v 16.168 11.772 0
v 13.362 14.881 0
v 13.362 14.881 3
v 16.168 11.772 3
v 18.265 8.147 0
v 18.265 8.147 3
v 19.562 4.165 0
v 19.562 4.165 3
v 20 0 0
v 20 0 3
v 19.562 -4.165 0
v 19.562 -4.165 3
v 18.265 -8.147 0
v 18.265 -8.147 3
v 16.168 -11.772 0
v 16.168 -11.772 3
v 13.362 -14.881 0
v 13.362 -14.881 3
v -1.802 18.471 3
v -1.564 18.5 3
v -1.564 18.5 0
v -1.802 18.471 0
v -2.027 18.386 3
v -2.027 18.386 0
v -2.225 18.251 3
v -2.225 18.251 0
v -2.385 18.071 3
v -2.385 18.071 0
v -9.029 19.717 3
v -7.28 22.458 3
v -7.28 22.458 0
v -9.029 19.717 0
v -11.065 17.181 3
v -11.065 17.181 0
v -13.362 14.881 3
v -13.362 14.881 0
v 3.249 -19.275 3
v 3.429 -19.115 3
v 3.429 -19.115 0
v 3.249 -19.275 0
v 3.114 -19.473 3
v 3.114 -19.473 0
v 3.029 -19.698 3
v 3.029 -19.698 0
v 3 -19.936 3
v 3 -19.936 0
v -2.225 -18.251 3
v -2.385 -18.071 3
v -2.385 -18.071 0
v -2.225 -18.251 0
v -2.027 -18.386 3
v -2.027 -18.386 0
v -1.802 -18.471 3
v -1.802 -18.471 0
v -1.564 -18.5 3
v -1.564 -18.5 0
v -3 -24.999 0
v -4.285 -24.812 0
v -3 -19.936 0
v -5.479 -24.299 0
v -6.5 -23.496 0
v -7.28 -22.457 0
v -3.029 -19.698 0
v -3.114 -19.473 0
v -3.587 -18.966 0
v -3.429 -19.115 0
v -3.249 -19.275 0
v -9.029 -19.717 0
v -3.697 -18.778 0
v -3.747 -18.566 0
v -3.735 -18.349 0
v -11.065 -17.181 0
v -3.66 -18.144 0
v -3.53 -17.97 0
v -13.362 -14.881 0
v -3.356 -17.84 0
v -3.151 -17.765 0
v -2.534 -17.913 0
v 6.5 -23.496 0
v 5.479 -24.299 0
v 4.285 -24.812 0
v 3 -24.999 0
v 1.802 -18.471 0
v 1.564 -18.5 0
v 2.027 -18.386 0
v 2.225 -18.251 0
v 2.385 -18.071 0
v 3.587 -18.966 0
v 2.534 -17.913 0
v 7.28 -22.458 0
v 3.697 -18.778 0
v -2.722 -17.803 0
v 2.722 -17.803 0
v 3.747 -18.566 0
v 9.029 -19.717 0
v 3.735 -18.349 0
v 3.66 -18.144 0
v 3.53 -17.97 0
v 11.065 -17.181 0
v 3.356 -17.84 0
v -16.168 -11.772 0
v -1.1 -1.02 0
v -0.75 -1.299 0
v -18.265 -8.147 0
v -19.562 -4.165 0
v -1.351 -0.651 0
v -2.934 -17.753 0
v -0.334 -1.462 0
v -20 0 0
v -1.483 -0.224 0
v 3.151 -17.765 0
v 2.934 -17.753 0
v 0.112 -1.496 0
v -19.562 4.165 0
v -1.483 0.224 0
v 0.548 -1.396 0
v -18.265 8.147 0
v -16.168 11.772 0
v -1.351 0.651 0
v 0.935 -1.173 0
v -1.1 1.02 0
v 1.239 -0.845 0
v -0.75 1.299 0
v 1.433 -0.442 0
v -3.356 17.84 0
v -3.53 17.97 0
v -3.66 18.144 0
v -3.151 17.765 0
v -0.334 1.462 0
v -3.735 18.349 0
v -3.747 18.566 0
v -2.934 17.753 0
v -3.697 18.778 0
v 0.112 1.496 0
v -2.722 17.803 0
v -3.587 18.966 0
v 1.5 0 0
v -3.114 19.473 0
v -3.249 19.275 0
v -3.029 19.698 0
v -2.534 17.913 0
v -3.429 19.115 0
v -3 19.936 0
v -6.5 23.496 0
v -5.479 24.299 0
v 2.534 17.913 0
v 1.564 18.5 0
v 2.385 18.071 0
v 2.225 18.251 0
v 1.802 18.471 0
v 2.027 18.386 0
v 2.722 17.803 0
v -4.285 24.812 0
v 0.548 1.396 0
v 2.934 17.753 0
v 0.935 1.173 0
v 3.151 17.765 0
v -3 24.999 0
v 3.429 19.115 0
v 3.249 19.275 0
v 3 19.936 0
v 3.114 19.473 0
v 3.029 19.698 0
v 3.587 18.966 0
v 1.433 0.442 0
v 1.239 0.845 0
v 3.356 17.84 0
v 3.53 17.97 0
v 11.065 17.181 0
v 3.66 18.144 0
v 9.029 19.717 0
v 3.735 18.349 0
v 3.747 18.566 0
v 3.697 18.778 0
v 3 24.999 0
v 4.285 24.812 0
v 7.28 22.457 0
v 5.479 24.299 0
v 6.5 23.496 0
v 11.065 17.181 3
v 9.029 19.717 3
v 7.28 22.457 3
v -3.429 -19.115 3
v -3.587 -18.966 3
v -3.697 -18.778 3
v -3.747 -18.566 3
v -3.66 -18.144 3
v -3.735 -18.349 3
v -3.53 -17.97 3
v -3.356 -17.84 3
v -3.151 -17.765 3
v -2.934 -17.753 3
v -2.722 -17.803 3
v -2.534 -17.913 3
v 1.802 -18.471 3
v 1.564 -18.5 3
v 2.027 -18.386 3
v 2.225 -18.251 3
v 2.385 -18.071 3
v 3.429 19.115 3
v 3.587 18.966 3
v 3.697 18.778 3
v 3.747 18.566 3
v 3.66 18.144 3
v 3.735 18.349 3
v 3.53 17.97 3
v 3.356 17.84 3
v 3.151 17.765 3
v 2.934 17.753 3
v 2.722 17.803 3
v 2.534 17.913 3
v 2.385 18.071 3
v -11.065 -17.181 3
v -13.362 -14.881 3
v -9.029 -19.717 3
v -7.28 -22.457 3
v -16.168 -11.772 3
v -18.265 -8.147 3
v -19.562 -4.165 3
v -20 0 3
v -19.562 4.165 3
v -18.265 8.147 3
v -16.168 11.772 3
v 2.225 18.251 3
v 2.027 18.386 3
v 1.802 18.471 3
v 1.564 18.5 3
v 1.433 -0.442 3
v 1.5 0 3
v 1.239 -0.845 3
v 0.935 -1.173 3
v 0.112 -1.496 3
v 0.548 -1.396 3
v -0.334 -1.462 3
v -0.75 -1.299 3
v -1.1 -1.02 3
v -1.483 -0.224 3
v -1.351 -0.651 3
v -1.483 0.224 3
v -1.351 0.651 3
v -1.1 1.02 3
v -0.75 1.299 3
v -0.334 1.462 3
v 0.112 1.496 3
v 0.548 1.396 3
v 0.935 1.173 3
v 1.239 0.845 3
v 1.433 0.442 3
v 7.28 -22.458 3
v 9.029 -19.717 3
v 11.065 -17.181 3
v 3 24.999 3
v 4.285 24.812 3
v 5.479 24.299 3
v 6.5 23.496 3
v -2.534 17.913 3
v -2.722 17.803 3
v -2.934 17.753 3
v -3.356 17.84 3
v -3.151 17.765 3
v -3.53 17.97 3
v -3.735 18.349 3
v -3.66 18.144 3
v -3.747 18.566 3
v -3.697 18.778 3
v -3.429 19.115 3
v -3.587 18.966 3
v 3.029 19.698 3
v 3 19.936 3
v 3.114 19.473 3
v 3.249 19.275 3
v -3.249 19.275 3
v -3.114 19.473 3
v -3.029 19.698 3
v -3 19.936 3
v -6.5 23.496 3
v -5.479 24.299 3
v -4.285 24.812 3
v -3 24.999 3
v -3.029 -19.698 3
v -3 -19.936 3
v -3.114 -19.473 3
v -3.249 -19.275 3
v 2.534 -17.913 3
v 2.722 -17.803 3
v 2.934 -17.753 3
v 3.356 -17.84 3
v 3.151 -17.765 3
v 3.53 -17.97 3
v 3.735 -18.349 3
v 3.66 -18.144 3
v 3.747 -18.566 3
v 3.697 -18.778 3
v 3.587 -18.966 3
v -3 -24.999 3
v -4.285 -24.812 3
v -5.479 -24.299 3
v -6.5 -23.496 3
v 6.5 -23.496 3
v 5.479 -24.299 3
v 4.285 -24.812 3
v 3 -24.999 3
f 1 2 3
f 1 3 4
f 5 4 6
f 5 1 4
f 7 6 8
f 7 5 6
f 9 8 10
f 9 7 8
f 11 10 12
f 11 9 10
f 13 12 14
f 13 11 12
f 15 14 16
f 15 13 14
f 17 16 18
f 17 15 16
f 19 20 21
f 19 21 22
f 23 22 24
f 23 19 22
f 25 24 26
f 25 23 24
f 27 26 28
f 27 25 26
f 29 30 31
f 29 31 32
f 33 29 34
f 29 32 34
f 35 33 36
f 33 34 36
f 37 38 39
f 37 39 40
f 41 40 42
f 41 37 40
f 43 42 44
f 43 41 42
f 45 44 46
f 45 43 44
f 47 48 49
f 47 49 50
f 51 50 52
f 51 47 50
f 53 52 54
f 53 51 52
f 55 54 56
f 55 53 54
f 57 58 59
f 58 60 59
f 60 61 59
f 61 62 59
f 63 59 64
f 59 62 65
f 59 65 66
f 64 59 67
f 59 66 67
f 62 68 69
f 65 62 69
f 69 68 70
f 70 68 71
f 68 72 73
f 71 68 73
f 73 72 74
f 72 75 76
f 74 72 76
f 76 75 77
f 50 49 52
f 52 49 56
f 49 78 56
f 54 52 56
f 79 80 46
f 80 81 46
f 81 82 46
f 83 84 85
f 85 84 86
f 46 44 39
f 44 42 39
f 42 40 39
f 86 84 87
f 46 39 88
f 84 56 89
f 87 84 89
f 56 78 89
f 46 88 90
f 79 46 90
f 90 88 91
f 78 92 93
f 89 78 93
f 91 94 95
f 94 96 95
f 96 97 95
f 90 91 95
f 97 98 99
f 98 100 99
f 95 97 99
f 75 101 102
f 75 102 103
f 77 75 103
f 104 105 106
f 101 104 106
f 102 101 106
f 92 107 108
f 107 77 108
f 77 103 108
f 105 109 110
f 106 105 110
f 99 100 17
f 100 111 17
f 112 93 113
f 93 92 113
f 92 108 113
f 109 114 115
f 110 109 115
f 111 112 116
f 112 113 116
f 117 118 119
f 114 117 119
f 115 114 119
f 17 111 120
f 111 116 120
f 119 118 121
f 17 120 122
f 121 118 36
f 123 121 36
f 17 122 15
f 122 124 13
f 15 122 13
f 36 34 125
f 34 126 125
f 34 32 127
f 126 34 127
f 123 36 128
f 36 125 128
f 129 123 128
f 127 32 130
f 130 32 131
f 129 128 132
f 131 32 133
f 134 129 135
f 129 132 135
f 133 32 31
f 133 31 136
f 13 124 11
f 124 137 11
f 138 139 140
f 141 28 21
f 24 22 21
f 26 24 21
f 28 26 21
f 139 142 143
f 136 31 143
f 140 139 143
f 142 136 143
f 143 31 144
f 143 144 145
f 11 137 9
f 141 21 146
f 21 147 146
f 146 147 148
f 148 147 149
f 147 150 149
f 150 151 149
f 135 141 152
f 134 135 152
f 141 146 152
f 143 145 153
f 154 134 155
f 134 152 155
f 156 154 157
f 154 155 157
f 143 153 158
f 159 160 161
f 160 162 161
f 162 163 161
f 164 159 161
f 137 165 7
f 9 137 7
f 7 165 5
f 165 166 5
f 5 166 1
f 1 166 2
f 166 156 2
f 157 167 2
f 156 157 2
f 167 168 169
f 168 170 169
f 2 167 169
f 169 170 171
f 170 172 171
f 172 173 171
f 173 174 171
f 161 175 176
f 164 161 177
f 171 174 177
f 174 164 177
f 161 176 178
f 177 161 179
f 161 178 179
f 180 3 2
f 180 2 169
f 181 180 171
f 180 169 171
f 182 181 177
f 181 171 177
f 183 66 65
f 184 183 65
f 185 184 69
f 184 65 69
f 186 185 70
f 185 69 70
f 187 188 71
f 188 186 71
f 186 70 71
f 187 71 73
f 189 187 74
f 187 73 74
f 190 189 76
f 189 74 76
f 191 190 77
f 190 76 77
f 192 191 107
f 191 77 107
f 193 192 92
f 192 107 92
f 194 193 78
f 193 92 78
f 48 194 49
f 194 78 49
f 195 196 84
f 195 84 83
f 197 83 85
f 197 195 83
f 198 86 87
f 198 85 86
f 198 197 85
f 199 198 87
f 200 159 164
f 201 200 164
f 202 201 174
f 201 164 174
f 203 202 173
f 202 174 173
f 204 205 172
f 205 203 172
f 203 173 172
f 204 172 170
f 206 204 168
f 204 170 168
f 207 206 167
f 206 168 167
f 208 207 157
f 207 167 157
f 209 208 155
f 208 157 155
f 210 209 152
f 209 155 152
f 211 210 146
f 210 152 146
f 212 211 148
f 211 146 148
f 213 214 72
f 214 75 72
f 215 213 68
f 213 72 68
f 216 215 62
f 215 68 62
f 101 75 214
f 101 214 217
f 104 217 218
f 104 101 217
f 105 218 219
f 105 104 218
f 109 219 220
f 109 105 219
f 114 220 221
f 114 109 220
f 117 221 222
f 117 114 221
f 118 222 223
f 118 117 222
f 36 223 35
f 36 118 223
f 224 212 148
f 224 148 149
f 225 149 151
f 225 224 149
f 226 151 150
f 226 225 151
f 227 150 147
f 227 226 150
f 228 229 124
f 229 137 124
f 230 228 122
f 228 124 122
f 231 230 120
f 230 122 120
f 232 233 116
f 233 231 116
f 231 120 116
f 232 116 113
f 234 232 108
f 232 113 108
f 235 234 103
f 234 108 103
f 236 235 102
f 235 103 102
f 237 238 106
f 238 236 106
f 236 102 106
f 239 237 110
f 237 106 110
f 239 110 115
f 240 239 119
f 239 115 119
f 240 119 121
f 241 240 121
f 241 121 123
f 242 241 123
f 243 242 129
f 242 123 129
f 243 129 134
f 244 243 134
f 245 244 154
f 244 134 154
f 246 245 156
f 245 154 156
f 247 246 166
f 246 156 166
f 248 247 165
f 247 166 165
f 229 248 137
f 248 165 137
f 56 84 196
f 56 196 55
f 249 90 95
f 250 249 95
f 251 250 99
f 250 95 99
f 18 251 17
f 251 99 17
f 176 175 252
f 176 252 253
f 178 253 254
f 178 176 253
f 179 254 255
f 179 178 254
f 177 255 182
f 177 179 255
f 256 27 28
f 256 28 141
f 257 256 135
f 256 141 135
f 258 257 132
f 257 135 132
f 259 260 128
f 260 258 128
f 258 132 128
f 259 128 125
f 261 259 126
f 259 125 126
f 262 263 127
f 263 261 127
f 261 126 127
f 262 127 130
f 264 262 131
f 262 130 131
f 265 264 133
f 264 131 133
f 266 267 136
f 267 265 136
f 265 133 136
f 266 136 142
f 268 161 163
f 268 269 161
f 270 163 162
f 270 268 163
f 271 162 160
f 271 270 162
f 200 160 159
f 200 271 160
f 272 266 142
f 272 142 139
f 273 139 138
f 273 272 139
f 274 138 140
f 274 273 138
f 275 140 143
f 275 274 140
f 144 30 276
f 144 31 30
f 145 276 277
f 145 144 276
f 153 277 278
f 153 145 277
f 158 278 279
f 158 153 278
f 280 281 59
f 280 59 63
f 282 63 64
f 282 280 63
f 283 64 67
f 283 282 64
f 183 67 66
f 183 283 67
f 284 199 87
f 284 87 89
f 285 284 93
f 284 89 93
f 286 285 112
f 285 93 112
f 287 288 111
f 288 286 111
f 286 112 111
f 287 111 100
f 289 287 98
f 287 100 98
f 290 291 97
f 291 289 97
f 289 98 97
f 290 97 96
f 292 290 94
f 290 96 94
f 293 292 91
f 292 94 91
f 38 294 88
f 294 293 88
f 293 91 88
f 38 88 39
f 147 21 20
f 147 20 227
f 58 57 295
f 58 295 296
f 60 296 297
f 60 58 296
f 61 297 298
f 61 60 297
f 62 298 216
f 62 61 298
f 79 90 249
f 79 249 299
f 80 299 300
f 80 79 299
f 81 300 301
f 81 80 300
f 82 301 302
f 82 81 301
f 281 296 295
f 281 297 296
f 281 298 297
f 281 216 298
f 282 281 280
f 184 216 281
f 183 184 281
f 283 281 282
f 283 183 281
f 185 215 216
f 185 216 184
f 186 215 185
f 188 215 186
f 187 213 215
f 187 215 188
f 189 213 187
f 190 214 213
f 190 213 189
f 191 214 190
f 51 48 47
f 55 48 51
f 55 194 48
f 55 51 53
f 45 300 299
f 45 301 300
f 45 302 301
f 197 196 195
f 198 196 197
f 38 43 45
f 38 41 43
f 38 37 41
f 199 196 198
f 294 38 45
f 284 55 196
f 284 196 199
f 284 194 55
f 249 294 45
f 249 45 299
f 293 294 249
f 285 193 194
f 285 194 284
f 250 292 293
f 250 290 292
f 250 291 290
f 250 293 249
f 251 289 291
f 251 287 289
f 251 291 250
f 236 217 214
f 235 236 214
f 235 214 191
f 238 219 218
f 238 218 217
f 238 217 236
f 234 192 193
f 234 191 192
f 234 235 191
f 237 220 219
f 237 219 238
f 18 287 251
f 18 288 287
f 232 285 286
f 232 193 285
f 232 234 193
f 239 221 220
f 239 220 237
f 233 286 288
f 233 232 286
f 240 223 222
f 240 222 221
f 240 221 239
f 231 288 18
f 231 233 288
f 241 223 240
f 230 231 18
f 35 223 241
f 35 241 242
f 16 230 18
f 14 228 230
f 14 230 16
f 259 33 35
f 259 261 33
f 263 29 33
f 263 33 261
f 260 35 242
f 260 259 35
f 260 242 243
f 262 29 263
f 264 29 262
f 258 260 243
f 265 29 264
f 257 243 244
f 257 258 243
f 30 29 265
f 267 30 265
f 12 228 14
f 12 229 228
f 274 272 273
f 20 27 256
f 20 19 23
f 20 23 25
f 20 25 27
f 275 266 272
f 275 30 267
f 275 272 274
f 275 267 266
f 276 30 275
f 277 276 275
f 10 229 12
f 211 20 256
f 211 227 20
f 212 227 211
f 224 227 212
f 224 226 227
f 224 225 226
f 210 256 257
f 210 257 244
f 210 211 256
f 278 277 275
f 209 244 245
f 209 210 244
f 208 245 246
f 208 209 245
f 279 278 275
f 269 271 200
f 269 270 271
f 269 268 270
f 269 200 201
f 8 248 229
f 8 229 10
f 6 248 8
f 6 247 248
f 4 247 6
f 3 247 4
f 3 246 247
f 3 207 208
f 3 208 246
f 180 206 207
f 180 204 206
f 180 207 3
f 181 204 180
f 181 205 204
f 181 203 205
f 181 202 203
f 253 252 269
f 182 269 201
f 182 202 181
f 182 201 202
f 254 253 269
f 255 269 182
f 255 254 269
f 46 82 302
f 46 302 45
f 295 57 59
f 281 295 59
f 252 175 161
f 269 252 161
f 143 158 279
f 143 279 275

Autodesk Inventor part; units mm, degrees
ref_plane "YZ Plane" through (0, 0, 0) normal (1, 0, 0) x (0, 1, 0)
ref_plane "XZ Plane" through (0, 0, 0) normal (0, 1, 0) x (-1, 0, 0)
ref_plane "XY Plane" through (0, 0, 0) normal (0, 0, 1) x (1, 0, 0)
sketch "Sketch1" plane through (0, 0, 0) normal (0, 0, 1) x (1, 0, 0)
  circle A0 centre (0, 0) radius 1.5
  circle A1 centre (0, 0) radius 15.875 construction
  line L0 (0, 20) -> (0, -20) construction
  line L1 (-20, 0) -> (20, 0) construction
  line L2 (-2.25, 18.5) -> (0, 18.5)
  line L3 (-6, 25) -> (-3, 25)
  line L4 (-3, 25) -> (-3, 19.25)
  line L5 (2.25, 18.5) -> (0, 18.5)
  line L6 (6, 25) -> (3, 25)
  line L7 (3, 25) -> (3, 19.25)
  line L8 (-2.25, -18.5) -> (0, -18.5)
  line L9 (-6, -25) -> (-3, -25)
  line L10 (-3, -25) -> (-3, -19.25)
  line L11 (2.25, -18.5) -> (0, -18.5)
  line L12 (3, -25) -> (3, -19.25)
  line L13 (6, -25) -> (3, -25)
  arc A2 (-13.3625, 14.881) -> (-13.3625, -14.881) centre (0, 0) ccw
  arc A3 (13.3625, -14.881) -> (13.3625, 14.881) centre (0, 0) ccw
  circle A4 centre (0, 0) radius 20 construction
  arc A5 (-3, 19.25) -> (-2.25, 18.5) centre (-3, 18.5) ccw
  arc A6 (2.25, 18.5) -> (3, 19.25) centre (3, 18.5) ccw
  arc A7 (-2.25, -18.5) -> (-3, -19.25) centre (-3, -18.5) ccw
  arc A8 (3, -19.25) -> (2.25, -18.5) centre (3, -18.5) ccw
  arc A9 (-13.3625, 14.881) -> (-6, 25) centre (-33.4062, 37.2025) ccw
  arc A10 (6, 25) -> (13.3625, 14.881) centre (33.4062, 37.2025) ccw
  arc A11 (-6, -25) -> (-13.3625, -14.881) centre (-33.4062, -37.2025) ccw
  arc A12 (13.3625, -14.881) -> (6, -25) centre (33.4062, -37.2025) ccw
  dimension "d9" = 40
  dimension "d0" = 3
  dimension "d1" = 31.75
  dimension "GripLength" = 1.5
  dimension "d4" = 5
  dimension "d5" = 3
  dimension "d6" = 3
  dimension "d8" = 20
  dimension "d10" = 0.75
  dimension "d15" = 30
extrude "Extrusion1" add sketch "Sketch1" along normal blind 3
fillet "Fillet1" radius 1 8 edges at (-3, 19.25, 1.5) (-2.25, 18.5, 1.5) (2.25, 18.5, 1.5) (3, 19.25, 1.5) (-3, -19.25, 1.5) (-2.25, -18.5, 1.5) (2.25, -18.5, 1.5) (3, -19.25, 1.5)
fillet "Fillet2" radius 5 8 edges at (-13.3625, -14.881, 1.5) (-6, -25, 1.5) (6, -25, 1.5) (13.3625, -14.881, 1.5) (13.3625, 14.881, 1.5) (6, 25, 1.5) (-6, 25, 1.5) (-13.3625, 14.881, 1.5)
equation "\"d1\" = BattOD"
equation "\"BattOD\" = 31.75"
properties part number "Forward Endcap Outer"
